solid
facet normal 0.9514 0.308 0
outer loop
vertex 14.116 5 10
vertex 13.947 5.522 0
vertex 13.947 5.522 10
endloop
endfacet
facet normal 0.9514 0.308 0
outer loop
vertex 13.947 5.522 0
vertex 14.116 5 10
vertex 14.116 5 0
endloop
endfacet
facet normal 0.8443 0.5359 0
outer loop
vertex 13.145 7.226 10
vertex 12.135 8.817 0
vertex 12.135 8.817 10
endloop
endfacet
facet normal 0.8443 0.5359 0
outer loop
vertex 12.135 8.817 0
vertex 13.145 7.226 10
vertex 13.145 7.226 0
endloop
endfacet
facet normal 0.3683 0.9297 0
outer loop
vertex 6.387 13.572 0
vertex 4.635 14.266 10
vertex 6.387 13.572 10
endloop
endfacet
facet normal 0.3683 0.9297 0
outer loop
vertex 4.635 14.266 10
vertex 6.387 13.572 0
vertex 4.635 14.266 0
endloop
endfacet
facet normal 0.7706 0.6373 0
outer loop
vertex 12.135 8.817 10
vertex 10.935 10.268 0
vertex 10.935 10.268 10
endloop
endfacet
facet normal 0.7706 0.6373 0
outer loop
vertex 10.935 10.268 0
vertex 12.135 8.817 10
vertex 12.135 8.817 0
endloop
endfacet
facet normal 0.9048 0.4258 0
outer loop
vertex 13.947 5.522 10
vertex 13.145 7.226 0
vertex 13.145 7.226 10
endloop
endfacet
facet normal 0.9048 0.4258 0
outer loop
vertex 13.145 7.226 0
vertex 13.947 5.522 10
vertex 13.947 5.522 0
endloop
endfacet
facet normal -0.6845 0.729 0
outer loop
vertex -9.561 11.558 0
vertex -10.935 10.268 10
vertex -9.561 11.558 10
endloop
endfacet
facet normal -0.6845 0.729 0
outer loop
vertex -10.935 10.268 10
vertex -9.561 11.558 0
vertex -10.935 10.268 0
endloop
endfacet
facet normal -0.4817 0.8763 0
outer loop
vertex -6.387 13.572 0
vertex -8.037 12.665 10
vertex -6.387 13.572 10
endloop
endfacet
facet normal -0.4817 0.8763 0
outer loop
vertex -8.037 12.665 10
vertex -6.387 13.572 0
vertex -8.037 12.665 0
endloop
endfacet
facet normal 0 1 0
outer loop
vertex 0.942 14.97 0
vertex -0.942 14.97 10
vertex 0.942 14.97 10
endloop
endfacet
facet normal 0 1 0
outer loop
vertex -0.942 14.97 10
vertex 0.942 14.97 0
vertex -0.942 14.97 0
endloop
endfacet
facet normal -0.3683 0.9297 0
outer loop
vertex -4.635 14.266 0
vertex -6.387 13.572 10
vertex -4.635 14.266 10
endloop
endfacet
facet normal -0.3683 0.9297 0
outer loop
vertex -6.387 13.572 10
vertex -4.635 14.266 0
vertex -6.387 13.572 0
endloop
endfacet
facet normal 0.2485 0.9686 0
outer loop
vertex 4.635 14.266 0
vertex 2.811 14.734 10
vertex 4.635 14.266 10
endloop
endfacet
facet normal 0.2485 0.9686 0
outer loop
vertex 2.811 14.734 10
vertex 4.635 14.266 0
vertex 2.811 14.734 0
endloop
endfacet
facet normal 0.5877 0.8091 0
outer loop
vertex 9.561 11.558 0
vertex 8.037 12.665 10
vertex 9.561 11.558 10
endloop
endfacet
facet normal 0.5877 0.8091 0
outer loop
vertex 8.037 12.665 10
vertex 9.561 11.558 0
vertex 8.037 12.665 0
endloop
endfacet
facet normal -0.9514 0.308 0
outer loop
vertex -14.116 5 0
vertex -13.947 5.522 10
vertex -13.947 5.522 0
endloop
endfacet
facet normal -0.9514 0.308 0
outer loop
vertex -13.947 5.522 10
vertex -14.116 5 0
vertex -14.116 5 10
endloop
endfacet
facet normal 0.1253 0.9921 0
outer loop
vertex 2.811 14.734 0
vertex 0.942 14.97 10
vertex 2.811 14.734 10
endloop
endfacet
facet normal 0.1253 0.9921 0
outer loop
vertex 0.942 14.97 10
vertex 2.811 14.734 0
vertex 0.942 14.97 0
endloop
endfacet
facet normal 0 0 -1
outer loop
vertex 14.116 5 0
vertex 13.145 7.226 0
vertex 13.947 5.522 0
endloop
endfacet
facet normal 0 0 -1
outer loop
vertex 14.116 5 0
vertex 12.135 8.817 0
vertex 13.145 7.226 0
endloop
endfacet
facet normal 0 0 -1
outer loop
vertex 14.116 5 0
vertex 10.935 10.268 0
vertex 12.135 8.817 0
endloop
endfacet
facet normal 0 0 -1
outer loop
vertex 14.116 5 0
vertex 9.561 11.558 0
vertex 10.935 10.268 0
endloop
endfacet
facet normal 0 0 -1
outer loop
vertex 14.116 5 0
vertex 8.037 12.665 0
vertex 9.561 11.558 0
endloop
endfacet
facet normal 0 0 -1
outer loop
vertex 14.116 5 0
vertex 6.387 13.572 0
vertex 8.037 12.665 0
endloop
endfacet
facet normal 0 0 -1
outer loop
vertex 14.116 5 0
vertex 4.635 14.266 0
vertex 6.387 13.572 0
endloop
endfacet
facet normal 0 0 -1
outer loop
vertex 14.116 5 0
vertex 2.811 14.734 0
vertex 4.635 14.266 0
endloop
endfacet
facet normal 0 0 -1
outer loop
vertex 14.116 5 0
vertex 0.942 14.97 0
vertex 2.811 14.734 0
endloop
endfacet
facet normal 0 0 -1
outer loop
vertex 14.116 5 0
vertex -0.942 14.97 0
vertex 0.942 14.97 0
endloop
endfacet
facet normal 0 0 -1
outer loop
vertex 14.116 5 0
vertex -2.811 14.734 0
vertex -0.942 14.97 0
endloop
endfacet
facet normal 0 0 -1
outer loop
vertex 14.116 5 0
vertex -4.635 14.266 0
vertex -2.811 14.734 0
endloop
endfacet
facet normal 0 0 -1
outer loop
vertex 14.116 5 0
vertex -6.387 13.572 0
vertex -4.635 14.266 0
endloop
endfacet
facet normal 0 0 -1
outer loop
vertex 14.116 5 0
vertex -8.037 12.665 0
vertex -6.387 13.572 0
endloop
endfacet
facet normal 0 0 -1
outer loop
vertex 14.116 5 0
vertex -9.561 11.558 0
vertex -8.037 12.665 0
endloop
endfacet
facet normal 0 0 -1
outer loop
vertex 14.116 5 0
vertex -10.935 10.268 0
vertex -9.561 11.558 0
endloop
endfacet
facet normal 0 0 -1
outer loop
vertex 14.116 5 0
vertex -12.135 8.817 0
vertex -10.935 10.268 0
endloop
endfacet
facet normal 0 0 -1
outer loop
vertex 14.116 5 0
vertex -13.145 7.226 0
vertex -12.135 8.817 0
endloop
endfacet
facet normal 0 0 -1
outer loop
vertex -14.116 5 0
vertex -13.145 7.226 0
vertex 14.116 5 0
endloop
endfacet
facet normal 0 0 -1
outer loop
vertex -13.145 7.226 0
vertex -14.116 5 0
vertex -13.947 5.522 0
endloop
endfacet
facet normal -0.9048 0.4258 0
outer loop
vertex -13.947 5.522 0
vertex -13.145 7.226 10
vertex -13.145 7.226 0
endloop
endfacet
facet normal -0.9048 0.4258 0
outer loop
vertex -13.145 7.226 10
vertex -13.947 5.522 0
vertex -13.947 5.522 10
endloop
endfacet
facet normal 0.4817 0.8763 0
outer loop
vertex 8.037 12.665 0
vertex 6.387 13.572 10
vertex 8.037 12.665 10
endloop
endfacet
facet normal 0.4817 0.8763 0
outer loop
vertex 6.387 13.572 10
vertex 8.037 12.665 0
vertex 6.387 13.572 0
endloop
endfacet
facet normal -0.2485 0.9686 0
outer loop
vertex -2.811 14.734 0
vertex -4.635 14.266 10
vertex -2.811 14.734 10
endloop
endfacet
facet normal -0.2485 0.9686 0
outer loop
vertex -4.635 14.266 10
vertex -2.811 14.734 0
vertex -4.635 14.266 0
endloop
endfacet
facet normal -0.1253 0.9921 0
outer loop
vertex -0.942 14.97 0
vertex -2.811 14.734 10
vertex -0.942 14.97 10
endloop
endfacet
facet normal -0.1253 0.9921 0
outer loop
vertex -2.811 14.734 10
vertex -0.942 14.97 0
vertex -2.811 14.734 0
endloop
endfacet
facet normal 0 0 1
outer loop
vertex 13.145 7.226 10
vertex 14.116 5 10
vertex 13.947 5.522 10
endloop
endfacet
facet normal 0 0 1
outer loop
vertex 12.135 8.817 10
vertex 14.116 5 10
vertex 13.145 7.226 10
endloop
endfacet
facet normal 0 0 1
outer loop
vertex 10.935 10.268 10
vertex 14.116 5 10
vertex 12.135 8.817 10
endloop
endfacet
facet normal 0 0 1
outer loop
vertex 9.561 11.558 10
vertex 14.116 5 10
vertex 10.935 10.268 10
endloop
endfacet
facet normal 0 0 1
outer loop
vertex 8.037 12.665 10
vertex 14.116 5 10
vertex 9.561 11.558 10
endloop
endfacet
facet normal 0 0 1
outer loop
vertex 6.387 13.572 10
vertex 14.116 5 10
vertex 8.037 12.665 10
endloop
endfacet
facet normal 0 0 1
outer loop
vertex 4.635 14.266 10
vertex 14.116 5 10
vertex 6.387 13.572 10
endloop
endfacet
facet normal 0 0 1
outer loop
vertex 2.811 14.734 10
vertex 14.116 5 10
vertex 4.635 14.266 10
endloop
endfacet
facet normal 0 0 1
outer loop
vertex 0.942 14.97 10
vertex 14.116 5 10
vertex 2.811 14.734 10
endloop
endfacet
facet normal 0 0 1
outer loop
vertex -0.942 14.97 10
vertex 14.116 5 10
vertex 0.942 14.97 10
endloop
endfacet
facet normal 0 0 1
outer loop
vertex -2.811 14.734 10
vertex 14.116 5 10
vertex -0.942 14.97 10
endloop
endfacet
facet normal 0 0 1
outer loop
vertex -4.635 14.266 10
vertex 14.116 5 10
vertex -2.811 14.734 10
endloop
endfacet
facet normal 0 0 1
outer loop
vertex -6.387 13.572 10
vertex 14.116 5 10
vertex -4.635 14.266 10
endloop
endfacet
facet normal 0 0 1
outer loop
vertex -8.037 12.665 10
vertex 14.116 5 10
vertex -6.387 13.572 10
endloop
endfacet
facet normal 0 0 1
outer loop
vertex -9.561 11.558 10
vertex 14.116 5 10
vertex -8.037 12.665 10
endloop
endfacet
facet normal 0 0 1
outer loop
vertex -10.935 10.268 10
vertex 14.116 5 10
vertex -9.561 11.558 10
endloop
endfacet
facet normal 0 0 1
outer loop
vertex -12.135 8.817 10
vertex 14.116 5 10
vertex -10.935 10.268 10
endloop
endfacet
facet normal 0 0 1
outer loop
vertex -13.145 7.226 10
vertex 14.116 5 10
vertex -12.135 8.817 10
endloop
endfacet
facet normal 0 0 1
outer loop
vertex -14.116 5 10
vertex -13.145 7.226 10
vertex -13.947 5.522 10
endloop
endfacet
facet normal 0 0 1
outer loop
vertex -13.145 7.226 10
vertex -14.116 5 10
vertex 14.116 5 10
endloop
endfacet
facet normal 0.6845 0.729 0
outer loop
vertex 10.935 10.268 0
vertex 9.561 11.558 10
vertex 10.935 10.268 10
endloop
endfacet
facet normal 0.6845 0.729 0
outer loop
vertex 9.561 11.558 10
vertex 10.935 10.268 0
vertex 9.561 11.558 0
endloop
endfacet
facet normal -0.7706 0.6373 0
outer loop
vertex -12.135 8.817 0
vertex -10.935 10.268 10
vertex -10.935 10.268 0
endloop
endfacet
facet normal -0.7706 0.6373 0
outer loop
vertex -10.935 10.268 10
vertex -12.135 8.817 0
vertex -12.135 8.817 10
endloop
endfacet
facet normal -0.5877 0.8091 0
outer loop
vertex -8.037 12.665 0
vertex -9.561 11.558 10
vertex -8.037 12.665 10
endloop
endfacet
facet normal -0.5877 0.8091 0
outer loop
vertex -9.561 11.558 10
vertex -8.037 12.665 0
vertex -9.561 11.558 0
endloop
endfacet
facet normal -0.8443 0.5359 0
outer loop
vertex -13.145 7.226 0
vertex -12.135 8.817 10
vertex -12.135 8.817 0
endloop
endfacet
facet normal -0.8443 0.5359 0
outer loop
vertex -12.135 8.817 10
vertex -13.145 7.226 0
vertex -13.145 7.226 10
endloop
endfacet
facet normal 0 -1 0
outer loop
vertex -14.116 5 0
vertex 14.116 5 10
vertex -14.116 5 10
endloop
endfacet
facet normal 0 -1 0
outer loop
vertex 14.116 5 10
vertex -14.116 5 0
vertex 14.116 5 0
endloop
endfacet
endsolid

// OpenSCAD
// Round Key

// Defaults

gRes = 50;
gNudge = 0.01;

module RoundKey(
	Dia,            // key diameter
	Slice,          // key slice removed
	Thick,          // key thickness
    Res = gRes,     // render resolution
	Nudge = gNudge) // render error compensation
	{
	difference()
		{
		cylinder(d = Dia, h = Thick, $fn = Res);
		translate([-Dia/2-Nudge,-1.5*Dia-2*Nudge+Slice,-Nudge])
		cube([Dia+2*Nudge,Dia+2*Nudge,Thick+2*Nudge]);
		}
	}

// Demo

RoundKey(30,20,10);//
